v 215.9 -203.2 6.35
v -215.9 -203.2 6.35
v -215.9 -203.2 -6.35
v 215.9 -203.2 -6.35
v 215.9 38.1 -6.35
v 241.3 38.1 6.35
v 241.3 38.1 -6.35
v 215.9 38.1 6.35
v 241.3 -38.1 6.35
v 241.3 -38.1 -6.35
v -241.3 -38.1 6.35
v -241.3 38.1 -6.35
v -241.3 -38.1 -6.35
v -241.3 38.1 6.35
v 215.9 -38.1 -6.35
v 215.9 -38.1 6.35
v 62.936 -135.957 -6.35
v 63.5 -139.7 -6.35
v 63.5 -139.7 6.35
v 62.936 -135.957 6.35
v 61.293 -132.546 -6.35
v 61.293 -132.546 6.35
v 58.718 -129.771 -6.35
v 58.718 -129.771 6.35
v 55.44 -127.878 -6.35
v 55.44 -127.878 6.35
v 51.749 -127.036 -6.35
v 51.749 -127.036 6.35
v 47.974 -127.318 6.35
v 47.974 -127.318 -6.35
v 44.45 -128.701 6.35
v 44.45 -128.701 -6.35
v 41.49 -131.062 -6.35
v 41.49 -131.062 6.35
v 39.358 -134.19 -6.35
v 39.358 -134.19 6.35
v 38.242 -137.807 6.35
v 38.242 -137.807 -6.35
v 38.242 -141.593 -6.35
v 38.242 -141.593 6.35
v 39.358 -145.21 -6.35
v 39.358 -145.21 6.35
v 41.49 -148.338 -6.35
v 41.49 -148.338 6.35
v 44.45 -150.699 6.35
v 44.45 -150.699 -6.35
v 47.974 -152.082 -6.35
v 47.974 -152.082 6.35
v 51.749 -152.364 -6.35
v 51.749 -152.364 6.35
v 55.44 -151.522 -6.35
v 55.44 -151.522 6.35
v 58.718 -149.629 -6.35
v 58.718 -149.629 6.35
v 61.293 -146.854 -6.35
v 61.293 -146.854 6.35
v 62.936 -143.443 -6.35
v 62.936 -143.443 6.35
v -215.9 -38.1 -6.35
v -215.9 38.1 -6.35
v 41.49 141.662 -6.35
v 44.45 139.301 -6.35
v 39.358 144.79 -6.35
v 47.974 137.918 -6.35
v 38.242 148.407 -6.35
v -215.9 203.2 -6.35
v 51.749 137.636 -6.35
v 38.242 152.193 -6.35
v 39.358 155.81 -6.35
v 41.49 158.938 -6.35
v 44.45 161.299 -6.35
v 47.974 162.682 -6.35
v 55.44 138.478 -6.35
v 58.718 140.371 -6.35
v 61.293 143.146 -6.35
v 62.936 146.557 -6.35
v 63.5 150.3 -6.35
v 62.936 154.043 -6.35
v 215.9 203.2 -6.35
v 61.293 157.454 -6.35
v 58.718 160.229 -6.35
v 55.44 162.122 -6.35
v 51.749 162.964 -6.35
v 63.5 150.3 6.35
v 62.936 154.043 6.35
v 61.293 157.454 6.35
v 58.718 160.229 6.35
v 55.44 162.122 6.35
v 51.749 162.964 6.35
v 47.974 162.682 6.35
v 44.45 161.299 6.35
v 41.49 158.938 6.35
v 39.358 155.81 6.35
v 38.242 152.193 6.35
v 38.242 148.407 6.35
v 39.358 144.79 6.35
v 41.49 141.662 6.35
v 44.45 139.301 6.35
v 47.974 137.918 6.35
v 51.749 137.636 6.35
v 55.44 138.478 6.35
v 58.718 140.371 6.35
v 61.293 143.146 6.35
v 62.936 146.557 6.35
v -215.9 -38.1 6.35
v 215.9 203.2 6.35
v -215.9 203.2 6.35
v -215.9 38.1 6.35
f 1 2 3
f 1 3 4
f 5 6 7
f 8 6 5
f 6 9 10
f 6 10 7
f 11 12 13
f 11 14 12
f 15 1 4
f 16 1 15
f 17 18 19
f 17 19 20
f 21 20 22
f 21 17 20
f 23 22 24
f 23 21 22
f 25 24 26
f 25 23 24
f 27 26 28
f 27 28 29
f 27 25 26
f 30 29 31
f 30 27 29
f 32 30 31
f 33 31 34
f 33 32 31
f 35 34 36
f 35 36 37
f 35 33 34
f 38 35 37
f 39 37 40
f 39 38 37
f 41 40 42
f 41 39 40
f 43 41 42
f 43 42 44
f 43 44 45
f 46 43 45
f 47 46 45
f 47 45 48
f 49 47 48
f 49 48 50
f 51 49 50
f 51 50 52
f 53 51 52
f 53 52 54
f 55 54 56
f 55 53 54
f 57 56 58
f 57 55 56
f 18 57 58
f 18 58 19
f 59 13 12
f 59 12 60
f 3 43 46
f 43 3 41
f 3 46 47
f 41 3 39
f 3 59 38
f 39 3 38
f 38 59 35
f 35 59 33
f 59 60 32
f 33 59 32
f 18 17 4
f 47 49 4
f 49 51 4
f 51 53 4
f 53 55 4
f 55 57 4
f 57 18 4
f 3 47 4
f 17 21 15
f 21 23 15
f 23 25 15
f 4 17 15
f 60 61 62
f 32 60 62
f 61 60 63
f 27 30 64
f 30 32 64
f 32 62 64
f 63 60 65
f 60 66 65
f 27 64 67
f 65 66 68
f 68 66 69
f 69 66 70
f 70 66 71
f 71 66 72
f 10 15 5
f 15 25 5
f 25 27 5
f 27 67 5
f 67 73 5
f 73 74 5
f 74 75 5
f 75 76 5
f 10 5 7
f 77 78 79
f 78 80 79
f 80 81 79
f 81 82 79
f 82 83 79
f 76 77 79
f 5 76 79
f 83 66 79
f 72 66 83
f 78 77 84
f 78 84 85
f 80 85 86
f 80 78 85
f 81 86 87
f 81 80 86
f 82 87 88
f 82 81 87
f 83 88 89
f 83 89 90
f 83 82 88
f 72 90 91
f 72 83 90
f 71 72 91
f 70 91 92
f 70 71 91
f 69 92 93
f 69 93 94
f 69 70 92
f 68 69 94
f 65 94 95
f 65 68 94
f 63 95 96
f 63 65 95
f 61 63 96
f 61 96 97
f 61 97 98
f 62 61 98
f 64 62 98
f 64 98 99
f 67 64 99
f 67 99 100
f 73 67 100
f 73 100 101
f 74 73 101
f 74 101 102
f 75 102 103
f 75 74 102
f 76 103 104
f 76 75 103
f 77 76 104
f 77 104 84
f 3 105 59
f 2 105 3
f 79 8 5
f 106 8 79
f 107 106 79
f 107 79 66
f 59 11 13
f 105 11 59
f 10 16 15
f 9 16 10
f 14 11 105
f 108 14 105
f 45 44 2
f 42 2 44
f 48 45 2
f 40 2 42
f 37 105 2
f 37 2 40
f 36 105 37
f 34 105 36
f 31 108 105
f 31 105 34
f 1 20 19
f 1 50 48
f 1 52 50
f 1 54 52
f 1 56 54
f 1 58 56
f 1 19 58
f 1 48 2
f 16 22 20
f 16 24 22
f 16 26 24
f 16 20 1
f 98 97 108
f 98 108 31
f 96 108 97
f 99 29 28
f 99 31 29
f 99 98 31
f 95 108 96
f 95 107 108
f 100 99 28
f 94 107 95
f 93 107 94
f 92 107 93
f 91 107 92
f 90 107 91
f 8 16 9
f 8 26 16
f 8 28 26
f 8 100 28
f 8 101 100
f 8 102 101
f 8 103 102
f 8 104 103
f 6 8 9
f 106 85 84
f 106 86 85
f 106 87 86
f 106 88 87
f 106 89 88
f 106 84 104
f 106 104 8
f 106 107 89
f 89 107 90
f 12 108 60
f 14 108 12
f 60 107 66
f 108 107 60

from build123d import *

# Parameters (mm, degrees)
BOSS_EXTRUDE1_DEPTH = 6.35
CAVITY1_START       = -6.35
CAVITY1_OUTLINE_R   = 12.7
CAVITY1_DEPTH       = 12.7


# Read off the part's stored shape, not the designer's step: Cavity1
with BuildPart() as part:
    # Sketch1 → Boss-Extrude1 (new, symmetric)
    with BuildSketch(Plane.XY):
        Polygon((-215.9, -38.1), (-215.9, -203.2), (215.9, -203.2), (215.9, -38.1), (241.3, -38.1), (241.3, 38.1), (215.9, 38.1), (215.9, 203.2), (-215.9, 203.2), (-215.9, 38.1), (-241.3, 38.1), (-241.3, -38.1), align=None)
    extrude(amount=BOSS_EXTRUDE1_DEPTH, both=True)

    # Cavity1 outline → Cavity1 (cut)
    with BuildSketch(Plane.XY.offset(CAVITY1_START)):
        with Locations((50.8, -139.7)):
            Circle(CAVITY1_OUTLINE_R)
        with Locations((50.8, 150.3)):
            Circle(CAVITY1_OUTLINE_R)
    extrude(amount=CAVITY1_DEPTH, mode=Mode.SUBTRACT)


solid = part.part
